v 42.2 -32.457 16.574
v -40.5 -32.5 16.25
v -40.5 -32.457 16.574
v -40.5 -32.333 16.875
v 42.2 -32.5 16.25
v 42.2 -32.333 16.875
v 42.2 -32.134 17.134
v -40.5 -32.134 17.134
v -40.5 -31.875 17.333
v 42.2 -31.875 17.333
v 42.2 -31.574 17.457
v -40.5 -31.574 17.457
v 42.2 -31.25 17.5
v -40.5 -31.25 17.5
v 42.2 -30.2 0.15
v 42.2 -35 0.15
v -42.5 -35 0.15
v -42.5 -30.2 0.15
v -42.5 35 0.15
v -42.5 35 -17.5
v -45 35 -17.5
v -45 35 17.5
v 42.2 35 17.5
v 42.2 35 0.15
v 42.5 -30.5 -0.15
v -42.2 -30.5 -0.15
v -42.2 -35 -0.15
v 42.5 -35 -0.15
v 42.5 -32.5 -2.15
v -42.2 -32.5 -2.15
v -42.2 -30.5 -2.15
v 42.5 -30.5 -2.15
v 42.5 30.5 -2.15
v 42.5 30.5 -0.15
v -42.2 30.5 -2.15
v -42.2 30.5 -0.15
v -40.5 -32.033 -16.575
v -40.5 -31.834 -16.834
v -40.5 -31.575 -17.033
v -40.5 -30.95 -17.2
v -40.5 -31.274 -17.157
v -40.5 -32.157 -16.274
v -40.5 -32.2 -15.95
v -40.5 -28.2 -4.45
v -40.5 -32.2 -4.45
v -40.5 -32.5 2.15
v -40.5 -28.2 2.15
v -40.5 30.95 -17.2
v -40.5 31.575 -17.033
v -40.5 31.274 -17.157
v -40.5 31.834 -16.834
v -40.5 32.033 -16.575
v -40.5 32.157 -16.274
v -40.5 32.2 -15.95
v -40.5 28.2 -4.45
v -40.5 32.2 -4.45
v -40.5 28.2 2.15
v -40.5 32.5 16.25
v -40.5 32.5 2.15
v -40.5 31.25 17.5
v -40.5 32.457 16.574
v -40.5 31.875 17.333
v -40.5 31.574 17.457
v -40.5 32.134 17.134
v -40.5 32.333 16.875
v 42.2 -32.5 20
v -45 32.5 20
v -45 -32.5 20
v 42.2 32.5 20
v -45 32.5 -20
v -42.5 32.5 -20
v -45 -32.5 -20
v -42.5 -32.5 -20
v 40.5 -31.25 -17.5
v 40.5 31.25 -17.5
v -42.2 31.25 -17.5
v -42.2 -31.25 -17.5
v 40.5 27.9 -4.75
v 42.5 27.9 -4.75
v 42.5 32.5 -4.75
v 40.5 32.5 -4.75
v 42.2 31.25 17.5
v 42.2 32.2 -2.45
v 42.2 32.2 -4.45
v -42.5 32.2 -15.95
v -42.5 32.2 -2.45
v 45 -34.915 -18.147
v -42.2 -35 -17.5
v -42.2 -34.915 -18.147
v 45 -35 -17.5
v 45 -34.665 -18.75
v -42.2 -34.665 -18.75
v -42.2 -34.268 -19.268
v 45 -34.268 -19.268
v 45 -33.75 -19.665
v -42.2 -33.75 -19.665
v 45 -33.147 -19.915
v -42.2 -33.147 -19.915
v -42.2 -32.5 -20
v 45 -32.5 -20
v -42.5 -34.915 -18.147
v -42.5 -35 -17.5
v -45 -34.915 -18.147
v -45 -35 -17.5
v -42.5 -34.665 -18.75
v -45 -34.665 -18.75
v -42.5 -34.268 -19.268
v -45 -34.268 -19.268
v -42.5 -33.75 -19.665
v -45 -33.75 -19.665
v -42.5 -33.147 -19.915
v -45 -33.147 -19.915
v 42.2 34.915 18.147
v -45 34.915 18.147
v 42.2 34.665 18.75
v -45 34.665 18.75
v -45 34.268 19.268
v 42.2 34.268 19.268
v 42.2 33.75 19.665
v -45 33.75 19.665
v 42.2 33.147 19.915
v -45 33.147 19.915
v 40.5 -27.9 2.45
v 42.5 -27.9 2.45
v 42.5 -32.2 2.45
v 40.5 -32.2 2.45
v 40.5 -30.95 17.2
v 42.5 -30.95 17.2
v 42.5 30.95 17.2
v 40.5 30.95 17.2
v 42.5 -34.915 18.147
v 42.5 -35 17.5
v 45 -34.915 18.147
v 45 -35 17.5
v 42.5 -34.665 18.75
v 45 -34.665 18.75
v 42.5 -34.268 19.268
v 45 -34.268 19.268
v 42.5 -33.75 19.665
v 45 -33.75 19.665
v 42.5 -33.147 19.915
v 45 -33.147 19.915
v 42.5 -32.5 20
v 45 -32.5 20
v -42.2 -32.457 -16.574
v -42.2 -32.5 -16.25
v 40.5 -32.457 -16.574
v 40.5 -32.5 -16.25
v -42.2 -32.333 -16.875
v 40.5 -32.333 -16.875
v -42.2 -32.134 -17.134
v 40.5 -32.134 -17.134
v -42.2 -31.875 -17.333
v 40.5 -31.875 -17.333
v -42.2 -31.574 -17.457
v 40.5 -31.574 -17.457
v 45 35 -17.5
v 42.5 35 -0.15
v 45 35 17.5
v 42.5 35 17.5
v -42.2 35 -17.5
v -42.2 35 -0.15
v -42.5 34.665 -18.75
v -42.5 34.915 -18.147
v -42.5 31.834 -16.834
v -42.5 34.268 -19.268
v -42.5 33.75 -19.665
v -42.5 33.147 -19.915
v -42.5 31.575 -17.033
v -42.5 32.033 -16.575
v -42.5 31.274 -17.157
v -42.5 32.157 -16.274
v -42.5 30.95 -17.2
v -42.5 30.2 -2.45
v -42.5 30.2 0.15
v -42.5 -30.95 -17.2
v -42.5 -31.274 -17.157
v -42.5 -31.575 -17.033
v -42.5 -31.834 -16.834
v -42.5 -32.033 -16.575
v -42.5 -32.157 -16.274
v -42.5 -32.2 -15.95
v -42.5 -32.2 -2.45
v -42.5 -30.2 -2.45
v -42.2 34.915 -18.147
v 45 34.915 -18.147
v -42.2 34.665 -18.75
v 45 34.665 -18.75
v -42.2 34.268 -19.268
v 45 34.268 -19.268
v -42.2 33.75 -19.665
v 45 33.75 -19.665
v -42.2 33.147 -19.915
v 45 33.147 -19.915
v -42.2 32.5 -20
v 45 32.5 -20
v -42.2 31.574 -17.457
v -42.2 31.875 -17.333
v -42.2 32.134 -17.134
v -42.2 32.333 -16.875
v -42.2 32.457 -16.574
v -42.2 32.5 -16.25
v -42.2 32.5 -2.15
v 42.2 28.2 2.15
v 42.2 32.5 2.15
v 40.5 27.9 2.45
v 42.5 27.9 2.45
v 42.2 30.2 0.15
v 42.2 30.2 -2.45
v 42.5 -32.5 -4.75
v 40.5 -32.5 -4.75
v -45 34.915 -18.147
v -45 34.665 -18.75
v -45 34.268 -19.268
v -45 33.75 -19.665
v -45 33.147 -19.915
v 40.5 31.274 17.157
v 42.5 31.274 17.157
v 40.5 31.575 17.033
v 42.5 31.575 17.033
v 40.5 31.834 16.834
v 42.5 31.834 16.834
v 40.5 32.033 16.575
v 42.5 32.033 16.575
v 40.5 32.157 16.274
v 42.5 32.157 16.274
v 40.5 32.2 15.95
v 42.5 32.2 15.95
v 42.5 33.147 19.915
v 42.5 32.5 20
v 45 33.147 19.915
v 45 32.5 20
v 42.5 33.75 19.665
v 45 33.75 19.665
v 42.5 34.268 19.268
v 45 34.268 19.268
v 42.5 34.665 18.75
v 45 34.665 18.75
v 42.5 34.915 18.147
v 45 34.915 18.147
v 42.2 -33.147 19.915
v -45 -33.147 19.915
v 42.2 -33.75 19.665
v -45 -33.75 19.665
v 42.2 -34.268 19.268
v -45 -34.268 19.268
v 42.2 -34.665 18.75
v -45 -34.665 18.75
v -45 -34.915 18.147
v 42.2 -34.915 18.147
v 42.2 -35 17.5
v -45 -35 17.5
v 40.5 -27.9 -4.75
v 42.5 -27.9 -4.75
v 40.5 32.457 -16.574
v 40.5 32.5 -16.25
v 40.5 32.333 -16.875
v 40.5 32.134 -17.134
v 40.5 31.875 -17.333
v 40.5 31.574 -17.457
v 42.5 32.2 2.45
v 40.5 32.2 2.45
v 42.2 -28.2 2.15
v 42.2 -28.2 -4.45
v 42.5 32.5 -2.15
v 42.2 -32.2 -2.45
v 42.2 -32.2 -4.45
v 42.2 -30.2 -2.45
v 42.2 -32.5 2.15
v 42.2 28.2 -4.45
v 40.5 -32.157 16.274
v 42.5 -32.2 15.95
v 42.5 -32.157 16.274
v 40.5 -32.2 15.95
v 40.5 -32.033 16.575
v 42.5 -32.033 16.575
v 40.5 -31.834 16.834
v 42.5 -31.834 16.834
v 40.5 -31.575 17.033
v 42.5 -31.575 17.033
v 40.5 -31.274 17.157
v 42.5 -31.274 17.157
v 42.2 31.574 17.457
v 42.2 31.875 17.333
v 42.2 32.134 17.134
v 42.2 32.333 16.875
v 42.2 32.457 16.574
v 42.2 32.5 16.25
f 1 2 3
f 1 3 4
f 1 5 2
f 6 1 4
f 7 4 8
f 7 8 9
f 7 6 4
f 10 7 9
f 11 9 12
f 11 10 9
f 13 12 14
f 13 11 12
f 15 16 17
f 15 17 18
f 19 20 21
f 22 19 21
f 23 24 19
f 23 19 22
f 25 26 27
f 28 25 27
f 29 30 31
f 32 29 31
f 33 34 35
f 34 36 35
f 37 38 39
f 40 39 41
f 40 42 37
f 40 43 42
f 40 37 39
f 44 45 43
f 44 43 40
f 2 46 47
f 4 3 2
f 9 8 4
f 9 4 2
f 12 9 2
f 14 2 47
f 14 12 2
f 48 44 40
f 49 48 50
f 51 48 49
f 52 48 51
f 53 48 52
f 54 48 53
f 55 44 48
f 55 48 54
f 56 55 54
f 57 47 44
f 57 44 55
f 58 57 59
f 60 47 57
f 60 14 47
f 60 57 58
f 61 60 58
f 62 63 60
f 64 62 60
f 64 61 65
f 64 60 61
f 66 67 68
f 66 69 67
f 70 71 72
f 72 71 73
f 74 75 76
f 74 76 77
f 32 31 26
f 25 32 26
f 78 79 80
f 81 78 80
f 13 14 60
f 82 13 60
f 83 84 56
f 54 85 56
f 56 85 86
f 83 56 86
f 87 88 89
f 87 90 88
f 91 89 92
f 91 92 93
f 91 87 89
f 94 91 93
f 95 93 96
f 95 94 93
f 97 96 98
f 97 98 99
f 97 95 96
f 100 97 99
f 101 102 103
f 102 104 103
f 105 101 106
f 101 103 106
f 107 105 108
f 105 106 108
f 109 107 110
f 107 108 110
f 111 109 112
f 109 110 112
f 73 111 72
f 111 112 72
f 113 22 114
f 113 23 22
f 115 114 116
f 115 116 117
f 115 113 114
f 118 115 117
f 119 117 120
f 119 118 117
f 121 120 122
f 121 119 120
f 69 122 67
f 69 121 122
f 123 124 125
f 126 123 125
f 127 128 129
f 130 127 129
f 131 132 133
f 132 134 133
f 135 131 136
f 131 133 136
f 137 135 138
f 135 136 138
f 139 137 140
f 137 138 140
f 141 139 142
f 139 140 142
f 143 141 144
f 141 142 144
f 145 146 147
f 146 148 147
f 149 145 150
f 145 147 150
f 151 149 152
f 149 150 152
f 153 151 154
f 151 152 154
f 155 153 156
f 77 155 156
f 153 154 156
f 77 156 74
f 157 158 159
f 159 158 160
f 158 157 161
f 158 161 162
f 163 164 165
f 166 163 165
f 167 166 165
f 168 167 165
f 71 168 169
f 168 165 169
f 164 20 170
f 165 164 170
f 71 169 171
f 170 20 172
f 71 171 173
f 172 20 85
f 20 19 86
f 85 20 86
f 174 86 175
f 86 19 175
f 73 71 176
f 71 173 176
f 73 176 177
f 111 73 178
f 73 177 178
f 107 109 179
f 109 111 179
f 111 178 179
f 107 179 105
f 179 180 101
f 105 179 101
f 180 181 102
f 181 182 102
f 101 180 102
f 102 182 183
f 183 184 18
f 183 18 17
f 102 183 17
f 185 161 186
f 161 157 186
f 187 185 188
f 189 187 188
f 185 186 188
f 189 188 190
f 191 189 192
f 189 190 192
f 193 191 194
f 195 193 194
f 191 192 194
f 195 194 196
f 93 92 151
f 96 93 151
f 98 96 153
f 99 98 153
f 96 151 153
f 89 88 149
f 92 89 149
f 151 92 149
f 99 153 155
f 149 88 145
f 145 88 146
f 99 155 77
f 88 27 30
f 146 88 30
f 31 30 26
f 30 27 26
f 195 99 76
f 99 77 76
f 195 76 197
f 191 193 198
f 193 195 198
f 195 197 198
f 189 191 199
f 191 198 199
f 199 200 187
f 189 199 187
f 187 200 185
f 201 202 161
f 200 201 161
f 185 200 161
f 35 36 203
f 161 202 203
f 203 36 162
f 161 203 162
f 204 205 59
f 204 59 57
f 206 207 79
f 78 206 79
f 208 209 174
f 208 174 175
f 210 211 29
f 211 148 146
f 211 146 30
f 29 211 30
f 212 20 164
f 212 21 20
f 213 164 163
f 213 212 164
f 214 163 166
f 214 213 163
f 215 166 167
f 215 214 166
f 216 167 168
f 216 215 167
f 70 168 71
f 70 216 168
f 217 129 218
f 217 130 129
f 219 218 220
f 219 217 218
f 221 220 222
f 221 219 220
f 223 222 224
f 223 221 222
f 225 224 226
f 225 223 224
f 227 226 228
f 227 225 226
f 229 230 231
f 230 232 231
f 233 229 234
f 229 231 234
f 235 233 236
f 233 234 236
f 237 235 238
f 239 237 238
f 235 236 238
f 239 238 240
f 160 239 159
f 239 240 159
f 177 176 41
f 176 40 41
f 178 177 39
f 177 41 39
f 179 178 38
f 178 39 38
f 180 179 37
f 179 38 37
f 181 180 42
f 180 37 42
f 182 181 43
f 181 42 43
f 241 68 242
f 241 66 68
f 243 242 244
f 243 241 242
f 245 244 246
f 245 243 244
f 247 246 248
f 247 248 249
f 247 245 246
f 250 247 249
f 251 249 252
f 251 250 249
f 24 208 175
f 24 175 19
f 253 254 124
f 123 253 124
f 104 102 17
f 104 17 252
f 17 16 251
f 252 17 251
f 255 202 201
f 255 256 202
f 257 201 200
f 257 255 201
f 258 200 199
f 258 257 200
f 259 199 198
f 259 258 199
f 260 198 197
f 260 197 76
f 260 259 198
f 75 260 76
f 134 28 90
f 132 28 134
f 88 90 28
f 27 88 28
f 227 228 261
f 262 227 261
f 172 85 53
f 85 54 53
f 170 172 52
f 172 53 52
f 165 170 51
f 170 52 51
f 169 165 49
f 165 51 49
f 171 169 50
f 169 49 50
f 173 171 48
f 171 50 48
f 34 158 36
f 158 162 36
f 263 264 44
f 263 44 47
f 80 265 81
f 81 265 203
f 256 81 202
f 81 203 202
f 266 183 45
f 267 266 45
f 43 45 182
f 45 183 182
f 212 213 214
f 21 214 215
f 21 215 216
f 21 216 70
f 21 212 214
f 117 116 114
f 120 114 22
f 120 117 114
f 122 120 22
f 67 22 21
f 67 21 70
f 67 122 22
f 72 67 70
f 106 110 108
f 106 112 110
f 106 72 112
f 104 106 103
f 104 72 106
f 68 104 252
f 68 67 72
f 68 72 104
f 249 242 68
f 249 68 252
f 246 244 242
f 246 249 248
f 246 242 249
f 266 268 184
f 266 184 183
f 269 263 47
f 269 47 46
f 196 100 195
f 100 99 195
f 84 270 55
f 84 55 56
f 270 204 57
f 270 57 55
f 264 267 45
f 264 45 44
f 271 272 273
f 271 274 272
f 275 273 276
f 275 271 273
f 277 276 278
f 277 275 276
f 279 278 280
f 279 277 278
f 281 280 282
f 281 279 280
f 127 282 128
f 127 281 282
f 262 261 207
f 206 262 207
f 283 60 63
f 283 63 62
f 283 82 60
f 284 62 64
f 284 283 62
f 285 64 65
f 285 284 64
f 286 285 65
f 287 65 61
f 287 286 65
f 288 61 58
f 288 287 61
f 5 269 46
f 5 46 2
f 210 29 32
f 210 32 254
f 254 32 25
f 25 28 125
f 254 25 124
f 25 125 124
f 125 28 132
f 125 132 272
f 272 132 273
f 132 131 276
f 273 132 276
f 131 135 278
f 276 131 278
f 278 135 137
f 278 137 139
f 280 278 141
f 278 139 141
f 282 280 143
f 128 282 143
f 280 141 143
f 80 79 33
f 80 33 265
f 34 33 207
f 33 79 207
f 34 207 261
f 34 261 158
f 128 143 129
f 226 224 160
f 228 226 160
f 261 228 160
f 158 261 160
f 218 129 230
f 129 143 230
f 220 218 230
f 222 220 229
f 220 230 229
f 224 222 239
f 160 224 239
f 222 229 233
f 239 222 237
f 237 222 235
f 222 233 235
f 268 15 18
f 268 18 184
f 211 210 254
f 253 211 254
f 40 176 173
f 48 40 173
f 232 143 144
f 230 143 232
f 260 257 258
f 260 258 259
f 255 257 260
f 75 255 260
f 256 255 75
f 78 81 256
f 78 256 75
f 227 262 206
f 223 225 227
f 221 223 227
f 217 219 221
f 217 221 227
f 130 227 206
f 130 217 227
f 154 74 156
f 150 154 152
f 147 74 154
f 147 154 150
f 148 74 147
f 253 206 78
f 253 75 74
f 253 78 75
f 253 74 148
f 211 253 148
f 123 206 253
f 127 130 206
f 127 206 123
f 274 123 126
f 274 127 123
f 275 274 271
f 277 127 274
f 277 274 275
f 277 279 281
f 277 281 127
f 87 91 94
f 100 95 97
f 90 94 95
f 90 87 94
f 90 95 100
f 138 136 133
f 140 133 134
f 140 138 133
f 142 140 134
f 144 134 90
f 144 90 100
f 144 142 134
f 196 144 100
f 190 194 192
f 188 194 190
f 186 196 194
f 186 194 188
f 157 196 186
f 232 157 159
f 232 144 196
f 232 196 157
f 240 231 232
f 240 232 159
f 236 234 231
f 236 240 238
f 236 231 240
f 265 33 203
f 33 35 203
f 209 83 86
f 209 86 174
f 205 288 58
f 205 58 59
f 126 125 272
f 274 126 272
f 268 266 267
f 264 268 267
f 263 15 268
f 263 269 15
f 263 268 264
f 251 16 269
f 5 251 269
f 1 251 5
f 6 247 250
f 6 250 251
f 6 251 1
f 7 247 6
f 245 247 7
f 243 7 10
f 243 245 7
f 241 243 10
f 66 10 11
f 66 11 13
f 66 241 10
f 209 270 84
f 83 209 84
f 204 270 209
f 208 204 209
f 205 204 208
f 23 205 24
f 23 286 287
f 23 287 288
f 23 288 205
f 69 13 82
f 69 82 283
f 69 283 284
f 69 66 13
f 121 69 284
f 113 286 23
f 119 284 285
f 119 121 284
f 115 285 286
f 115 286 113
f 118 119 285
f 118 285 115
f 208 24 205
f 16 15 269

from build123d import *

# Parameters (mm, degrees)
F5_DEPTH      = 42.2
F5_DEPTH_BACK = 42.5
F6_DEPTH      = 42.2
F6_DEPTH_BACK = 42.5
F7_W          = 70
F7_H          = 40
F8_DEPTH      = 2.5
F9_W          = 70
F9_H          = 40
F10_DEPTH     = 2.5
F12_DEPTH     = 2
F14_DEPTH     = 2
F15_R         = 2.5
F15_2_R       = 2.5
F16_R         = 1.25
F16_2_R       = 1.25


with BuildPart() as f5:
    # F4 (on face) → F5 (new body, two sides)
    with BuildSketch(Plane.YZ) as f5_sk:
        Polygon((-35, 20), (-35, 0.15), (-30.2, 0.15), (-30.2, -2.45), (-32.2, -2.45), (-32.2, -4.45), (-28.2, -4.45), (-28.2, 2.15), (-32.5, 2.15), (-32.5, 17.5), (32.5, 17.5), (32.5, 2.15), (28.2, 2.15), (28.2, -4.45), (32.2, -4.45), (32.2, -2.45), (30.2, -2.45), (30.2, 0.15), (35, 0.15), (35, 20), align=None)
    extrude(amount=F5_DEPTH)
    extrude(f5_sk.sketch, amount=-F5_DEPTH_BACK)

    # F7 (on face) → F8 (join, through all)
    with BuildSketch(Plane(origin=(-42.5, 0, 0), x_dir=(0, -1, 0), z_dir=(-1, 0, 0))):
        Rectangle(F7_W, F7_H)
    extrude(amount=F8_DEPTH)

    # F11 (on face) → F12 (join)
    with BuildSketch(Plane.YZ.offset(-42.5)):
        Polygon((-28.2, -4.45), (-32.2, -4.45), (-32.2, -17.2), (32.2, -17.2), (32.2, -4.45), (28.2, -4.45), (28.2, 2.15), (32.5, 2.15), (32.5, 17.5), (-32.5, 17.5), (-32.5, 2.15), (-28.2, 2.15), align=None)
    extrude(amount=F12_DEPTH)

    # F15
    f15_edges = [f5.edges().sort_by_distance(p)[0] for p in [
        (-1.4, -35, 20),
        (-1.4, 35, 20),
        (-43.75, -35, -20),
        (-43.75, 35, -20),
    ]]
    fillet(f15_edges, radius=F15_R)

    # F16
    f16_edges = [f5.edges().sort_by_distance(p)[0] for p in [
        (-41.5, -32.2, -17.2),
        (-41.5, 32.2, -17.2),
        (0.85, -32.5, 17.5),
        (0.85, 32.5, 17.5),
    ]]
    fillet(f16_edges, radius=F16_R)


with BuildPart() as f6:
    # F4 (on face) → F6 (new body, two sides)
    with BuildSketch(Plane.YZ) as f6_sk:
        Polygon((-30.5, -0.15), (-35, -0.15), (-35, -20), (35, -20), (35, -0.15), (30.5, -0.15), (30.5, -2.15), (32.5, -2.15), (32.5, -17.5), (-32.5, -17.5), (-32.5, -2.15), (-30.5, -2.15), align=None)
    extrude(amount=-F6_DEPTH)
    extrude(f6_sk.sketch, amount=F6_DEPTH_BACK)

    # F9 (on face) → F10 (join, through all)
    with BuildSketch(Plane.YZ.offset(42.5)):
        Rectangle(F9_W, F9_H)
    extrude(amount=F10_DEPTH)

    # F13 (on face) → F14 (join)
    with BuildSketch(Plane(origin=(42.5, 0, 0), x_dir=(0, -1, 0), z_dir=(-1, 0, 0))):
        Polygon((32.2, 17.2), (-32.2, 17.2), (-32.2, 2.45), (-27.9, 2.45), (-27.9, -4.75), (-32.5, -4.75), (-32.5, -17.5), (32.5, -17.5), (32.5, -4.75), (27.9, -4.75), (27.9, 2.45), (32.2, 2.45), align=None)
    extrude(amount=F14_DEPTH)

    # F15#2
    f15_2_edges = [f6.edges().sort_by_distance(p)[0] for p in [
        (1.4, -35, -20),
        (43.75, -35, 20),
        (43.75, 35, 20),
        (1.4, 35, -20),
    ]]
    fillet(f15_2_edges, radius=F15_2_R)

    # F16#2
    f16_2_edges = [f6.edges().sort_by_distance(p)[0] for p in [
        (-0.85, -32.5, -17.5),
        (-0.85, 32.5, -17.5),
        (41.5, 32.2, 17.2),
        (41.5, -32.2, 17.2),
    ]]
    fillet(f16_2_edges, radius=F16_2_R)


solid = Compound([f5.part, f6.part])
